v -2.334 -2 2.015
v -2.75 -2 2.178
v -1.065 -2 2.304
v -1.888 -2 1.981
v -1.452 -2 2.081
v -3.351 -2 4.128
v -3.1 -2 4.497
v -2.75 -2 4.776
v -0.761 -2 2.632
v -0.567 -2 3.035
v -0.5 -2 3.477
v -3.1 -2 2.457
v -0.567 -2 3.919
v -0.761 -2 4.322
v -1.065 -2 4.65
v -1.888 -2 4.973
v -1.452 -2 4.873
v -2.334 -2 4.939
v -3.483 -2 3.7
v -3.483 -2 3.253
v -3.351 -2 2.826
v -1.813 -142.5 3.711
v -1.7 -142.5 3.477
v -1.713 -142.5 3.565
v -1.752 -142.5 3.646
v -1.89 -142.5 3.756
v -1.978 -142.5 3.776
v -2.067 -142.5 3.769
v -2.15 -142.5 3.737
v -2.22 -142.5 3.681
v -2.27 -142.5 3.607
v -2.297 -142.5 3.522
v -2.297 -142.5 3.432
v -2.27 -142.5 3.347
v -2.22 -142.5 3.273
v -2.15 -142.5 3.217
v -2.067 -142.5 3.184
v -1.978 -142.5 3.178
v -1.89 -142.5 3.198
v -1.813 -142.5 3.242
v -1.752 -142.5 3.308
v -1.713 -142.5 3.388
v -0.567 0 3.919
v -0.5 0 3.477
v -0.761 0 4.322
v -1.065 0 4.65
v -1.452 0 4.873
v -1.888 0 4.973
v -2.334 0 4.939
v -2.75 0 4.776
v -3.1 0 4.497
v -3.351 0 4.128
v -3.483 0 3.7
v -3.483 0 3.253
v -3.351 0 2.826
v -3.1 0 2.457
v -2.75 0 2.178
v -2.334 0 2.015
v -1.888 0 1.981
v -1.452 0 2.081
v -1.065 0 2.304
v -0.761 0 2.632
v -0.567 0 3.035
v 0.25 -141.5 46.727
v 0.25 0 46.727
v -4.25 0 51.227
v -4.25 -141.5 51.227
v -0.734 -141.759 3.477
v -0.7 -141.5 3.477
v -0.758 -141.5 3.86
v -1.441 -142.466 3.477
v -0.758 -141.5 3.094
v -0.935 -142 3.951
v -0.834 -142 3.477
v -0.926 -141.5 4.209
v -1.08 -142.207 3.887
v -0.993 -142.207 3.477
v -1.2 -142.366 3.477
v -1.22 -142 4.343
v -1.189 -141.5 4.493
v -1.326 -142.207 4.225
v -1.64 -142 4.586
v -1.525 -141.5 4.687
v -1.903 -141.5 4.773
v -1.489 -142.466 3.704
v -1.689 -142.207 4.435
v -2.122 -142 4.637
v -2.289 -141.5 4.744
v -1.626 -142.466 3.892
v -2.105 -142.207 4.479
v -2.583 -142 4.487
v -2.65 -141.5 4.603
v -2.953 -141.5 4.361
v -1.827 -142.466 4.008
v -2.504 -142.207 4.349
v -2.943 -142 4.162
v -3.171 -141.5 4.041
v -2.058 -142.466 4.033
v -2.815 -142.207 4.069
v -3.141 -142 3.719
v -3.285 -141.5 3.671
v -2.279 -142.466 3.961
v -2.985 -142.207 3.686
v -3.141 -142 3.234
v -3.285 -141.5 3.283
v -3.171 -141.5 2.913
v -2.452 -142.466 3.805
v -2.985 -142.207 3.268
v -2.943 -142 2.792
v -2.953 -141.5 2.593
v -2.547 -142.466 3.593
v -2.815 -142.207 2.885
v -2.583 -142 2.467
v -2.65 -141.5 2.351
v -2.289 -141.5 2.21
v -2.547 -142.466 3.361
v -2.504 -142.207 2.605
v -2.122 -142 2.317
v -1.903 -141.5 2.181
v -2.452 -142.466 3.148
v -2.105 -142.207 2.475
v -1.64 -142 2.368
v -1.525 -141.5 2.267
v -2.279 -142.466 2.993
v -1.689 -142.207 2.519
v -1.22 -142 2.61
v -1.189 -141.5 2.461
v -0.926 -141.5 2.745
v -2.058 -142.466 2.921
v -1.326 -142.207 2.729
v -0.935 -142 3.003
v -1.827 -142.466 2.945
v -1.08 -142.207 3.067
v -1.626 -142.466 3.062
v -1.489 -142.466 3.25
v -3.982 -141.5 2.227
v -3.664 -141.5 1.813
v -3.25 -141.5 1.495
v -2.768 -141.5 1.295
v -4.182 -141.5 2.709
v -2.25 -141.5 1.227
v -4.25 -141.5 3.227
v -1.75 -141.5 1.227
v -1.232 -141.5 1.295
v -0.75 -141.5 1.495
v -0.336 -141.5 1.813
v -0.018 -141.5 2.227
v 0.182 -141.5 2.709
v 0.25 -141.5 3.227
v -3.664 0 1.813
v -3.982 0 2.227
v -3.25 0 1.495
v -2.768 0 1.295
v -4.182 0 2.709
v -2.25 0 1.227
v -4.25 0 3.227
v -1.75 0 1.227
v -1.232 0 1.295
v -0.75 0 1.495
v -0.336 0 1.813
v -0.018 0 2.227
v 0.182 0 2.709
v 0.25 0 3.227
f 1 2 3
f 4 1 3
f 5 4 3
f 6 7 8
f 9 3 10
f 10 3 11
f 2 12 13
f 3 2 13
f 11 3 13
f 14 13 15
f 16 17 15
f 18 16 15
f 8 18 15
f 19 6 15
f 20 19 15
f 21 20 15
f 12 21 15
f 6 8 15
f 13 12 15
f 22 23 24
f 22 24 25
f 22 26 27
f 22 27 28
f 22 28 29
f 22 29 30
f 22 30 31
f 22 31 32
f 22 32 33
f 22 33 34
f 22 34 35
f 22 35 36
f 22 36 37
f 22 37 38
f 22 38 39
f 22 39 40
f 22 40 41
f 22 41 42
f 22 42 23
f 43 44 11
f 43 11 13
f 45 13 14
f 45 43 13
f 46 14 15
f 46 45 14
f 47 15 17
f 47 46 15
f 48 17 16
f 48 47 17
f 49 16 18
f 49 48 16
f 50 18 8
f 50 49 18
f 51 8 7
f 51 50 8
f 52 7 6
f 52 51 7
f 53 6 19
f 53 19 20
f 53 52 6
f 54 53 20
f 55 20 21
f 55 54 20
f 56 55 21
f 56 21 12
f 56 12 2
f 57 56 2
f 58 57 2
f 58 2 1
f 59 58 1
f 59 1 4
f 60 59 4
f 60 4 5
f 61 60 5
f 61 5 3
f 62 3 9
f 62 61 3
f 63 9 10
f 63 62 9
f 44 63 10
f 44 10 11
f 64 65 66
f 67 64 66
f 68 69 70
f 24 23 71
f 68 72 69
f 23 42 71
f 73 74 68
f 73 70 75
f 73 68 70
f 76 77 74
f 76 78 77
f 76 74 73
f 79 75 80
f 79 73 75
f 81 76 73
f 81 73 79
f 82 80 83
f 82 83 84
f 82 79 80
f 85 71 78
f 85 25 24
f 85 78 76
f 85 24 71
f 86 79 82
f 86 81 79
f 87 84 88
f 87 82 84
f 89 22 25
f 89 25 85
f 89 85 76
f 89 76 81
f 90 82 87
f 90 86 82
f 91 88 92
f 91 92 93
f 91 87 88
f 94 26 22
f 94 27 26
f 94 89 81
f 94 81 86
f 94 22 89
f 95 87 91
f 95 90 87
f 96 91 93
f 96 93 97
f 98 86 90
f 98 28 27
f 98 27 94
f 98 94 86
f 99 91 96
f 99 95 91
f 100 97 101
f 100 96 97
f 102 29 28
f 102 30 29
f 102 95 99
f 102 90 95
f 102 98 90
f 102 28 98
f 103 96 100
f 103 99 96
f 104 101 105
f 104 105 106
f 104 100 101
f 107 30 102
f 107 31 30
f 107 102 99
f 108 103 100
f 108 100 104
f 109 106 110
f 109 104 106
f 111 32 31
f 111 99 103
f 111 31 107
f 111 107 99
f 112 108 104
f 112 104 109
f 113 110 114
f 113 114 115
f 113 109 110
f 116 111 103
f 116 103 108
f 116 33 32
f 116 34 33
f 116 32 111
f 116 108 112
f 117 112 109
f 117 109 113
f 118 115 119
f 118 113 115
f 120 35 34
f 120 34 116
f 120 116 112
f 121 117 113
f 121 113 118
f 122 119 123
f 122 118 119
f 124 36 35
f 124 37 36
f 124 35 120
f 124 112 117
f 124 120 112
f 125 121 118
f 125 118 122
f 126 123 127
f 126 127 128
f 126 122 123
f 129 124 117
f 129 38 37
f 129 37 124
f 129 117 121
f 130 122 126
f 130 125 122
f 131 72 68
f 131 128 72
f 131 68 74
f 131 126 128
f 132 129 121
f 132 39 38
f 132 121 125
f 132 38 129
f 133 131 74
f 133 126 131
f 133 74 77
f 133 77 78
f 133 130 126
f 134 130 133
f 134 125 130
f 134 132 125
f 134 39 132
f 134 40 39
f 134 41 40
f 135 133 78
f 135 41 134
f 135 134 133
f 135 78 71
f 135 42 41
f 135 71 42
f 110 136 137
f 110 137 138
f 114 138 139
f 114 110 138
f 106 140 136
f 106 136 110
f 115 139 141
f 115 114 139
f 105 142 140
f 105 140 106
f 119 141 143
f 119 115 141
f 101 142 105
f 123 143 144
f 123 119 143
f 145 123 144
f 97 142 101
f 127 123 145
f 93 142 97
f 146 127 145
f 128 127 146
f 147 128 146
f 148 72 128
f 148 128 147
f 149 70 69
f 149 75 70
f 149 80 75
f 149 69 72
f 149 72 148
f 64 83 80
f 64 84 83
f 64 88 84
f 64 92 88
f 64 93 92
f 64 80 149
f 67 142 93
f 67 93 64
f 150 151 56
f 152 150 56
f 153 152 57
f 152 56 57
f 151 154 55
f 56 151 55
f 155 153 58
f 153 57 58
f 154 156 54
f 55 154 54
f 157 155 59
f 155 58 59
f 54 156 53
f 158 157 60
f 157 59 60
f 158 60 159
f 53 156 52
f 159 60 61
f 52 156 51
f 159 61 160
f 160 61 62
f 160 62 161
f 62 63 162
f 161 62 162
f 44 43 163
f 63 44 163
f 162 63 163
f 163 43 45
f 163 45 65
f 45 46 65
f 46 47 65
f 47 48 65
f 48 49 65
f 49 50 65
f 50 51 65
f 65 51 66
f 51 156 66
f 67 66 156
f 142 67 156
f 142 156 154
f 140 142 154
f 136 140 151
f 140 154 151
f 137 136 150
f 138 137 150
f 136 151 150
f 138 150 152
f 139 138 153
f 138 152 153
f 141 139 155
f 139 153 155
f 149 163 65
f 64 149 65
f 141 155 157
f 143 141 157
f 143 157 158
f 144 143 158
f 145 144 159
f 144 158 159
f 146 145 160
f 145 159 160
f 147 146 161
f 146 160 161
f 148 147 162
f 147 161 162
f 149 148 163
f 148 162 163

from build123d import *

# Parameters (mm, degrees)
F0_R     = 1.5
F1_DEPTH = 141.5
F0_R_2   = 1.3
F2_DEPTH = 141.5
F3_DEPTH = 142.5
F4_DEPTH = 2
F5_R     = 0.99999


# Not quite as in the source:
# - a fillet or chamfer is up to 0.001 mm smaller than in the source, because OpenCascade refuses the exact size


with BuildPart() as f1:
    # F0 (on Front) → F1 (new body)
    with BuildSketch(Plane.XZ):
        with BuildLine():
            Line((0.25, 46.7269286196), (-4.25, 51.2269286196))
            Line((-4.25, 51.2269286196), (-4.25, 3.2269286196))
            ThreePointArc((-4.25, 3.2269286196), (-3.6642135624, 1.8127150573), (-2.25, 1.2269286196))
            Line((-2.25, 1.2269286196), (-1.75, 1.2269286196))
            ThreePointArc((-1.75, 1.2269286196), (-0.3357864376, 1.8127150573), (0.25, 3.2269286196))
            Line((0.25, 3.2269286196), (0.25, 46.7269286196))
        make_face()
        with Locations((-2, 3.4769286196)):
            Circle(F0_R, mode=Mode.SUBTRACT)
    extrude(amount=F1_DEPTH)

    # F0 (on Front) → F2 (join)
    with BuildSketch(Plane.XZ):
        with Locations((-2, 3.4769286196)):
            Circle(F0_R)
        with Locations((-2, 3.4769286196)):
            Circle(F0_R_2, mode=Mode.SUBTRACT)
    extrude(amount=F2_DEPTH)

    # F0 (on Front) → F3 (join)
    with BuildSketch(Plane.XZ):
        with Locations((-2, 3.4769286196)):
            Circle(F0_R_2)
    extrude(amount=F3_DEPTH)

    # F0 (on Front) → F4 (cut)
    with BuildSketch(Plane.XZ):
        with Locations((-2, 3.4769286196)):
            Circle(F0_R)
        with Locations((-2, 3.4769286196)):
            Circle(F0_R_2, mode=Mode.SUBTRACT)
        with Locations((-2, 3.4769286196)):
            Circle(F0_R_2)
    extrude(amount=F4_DEPTH, mode=Mode.SUBTRACT)

    # F5 (radius 1 in the source; OpenCascade refuses exactly that, so slightly less here)
    f5_edges = [f1.edges().sort_by_distance(p)[0] for p in [
        (-3.3, -142.5, 3.476929),
    ]]
    fillet(f5_edges, radius=F5_R)


solid = f1.part
